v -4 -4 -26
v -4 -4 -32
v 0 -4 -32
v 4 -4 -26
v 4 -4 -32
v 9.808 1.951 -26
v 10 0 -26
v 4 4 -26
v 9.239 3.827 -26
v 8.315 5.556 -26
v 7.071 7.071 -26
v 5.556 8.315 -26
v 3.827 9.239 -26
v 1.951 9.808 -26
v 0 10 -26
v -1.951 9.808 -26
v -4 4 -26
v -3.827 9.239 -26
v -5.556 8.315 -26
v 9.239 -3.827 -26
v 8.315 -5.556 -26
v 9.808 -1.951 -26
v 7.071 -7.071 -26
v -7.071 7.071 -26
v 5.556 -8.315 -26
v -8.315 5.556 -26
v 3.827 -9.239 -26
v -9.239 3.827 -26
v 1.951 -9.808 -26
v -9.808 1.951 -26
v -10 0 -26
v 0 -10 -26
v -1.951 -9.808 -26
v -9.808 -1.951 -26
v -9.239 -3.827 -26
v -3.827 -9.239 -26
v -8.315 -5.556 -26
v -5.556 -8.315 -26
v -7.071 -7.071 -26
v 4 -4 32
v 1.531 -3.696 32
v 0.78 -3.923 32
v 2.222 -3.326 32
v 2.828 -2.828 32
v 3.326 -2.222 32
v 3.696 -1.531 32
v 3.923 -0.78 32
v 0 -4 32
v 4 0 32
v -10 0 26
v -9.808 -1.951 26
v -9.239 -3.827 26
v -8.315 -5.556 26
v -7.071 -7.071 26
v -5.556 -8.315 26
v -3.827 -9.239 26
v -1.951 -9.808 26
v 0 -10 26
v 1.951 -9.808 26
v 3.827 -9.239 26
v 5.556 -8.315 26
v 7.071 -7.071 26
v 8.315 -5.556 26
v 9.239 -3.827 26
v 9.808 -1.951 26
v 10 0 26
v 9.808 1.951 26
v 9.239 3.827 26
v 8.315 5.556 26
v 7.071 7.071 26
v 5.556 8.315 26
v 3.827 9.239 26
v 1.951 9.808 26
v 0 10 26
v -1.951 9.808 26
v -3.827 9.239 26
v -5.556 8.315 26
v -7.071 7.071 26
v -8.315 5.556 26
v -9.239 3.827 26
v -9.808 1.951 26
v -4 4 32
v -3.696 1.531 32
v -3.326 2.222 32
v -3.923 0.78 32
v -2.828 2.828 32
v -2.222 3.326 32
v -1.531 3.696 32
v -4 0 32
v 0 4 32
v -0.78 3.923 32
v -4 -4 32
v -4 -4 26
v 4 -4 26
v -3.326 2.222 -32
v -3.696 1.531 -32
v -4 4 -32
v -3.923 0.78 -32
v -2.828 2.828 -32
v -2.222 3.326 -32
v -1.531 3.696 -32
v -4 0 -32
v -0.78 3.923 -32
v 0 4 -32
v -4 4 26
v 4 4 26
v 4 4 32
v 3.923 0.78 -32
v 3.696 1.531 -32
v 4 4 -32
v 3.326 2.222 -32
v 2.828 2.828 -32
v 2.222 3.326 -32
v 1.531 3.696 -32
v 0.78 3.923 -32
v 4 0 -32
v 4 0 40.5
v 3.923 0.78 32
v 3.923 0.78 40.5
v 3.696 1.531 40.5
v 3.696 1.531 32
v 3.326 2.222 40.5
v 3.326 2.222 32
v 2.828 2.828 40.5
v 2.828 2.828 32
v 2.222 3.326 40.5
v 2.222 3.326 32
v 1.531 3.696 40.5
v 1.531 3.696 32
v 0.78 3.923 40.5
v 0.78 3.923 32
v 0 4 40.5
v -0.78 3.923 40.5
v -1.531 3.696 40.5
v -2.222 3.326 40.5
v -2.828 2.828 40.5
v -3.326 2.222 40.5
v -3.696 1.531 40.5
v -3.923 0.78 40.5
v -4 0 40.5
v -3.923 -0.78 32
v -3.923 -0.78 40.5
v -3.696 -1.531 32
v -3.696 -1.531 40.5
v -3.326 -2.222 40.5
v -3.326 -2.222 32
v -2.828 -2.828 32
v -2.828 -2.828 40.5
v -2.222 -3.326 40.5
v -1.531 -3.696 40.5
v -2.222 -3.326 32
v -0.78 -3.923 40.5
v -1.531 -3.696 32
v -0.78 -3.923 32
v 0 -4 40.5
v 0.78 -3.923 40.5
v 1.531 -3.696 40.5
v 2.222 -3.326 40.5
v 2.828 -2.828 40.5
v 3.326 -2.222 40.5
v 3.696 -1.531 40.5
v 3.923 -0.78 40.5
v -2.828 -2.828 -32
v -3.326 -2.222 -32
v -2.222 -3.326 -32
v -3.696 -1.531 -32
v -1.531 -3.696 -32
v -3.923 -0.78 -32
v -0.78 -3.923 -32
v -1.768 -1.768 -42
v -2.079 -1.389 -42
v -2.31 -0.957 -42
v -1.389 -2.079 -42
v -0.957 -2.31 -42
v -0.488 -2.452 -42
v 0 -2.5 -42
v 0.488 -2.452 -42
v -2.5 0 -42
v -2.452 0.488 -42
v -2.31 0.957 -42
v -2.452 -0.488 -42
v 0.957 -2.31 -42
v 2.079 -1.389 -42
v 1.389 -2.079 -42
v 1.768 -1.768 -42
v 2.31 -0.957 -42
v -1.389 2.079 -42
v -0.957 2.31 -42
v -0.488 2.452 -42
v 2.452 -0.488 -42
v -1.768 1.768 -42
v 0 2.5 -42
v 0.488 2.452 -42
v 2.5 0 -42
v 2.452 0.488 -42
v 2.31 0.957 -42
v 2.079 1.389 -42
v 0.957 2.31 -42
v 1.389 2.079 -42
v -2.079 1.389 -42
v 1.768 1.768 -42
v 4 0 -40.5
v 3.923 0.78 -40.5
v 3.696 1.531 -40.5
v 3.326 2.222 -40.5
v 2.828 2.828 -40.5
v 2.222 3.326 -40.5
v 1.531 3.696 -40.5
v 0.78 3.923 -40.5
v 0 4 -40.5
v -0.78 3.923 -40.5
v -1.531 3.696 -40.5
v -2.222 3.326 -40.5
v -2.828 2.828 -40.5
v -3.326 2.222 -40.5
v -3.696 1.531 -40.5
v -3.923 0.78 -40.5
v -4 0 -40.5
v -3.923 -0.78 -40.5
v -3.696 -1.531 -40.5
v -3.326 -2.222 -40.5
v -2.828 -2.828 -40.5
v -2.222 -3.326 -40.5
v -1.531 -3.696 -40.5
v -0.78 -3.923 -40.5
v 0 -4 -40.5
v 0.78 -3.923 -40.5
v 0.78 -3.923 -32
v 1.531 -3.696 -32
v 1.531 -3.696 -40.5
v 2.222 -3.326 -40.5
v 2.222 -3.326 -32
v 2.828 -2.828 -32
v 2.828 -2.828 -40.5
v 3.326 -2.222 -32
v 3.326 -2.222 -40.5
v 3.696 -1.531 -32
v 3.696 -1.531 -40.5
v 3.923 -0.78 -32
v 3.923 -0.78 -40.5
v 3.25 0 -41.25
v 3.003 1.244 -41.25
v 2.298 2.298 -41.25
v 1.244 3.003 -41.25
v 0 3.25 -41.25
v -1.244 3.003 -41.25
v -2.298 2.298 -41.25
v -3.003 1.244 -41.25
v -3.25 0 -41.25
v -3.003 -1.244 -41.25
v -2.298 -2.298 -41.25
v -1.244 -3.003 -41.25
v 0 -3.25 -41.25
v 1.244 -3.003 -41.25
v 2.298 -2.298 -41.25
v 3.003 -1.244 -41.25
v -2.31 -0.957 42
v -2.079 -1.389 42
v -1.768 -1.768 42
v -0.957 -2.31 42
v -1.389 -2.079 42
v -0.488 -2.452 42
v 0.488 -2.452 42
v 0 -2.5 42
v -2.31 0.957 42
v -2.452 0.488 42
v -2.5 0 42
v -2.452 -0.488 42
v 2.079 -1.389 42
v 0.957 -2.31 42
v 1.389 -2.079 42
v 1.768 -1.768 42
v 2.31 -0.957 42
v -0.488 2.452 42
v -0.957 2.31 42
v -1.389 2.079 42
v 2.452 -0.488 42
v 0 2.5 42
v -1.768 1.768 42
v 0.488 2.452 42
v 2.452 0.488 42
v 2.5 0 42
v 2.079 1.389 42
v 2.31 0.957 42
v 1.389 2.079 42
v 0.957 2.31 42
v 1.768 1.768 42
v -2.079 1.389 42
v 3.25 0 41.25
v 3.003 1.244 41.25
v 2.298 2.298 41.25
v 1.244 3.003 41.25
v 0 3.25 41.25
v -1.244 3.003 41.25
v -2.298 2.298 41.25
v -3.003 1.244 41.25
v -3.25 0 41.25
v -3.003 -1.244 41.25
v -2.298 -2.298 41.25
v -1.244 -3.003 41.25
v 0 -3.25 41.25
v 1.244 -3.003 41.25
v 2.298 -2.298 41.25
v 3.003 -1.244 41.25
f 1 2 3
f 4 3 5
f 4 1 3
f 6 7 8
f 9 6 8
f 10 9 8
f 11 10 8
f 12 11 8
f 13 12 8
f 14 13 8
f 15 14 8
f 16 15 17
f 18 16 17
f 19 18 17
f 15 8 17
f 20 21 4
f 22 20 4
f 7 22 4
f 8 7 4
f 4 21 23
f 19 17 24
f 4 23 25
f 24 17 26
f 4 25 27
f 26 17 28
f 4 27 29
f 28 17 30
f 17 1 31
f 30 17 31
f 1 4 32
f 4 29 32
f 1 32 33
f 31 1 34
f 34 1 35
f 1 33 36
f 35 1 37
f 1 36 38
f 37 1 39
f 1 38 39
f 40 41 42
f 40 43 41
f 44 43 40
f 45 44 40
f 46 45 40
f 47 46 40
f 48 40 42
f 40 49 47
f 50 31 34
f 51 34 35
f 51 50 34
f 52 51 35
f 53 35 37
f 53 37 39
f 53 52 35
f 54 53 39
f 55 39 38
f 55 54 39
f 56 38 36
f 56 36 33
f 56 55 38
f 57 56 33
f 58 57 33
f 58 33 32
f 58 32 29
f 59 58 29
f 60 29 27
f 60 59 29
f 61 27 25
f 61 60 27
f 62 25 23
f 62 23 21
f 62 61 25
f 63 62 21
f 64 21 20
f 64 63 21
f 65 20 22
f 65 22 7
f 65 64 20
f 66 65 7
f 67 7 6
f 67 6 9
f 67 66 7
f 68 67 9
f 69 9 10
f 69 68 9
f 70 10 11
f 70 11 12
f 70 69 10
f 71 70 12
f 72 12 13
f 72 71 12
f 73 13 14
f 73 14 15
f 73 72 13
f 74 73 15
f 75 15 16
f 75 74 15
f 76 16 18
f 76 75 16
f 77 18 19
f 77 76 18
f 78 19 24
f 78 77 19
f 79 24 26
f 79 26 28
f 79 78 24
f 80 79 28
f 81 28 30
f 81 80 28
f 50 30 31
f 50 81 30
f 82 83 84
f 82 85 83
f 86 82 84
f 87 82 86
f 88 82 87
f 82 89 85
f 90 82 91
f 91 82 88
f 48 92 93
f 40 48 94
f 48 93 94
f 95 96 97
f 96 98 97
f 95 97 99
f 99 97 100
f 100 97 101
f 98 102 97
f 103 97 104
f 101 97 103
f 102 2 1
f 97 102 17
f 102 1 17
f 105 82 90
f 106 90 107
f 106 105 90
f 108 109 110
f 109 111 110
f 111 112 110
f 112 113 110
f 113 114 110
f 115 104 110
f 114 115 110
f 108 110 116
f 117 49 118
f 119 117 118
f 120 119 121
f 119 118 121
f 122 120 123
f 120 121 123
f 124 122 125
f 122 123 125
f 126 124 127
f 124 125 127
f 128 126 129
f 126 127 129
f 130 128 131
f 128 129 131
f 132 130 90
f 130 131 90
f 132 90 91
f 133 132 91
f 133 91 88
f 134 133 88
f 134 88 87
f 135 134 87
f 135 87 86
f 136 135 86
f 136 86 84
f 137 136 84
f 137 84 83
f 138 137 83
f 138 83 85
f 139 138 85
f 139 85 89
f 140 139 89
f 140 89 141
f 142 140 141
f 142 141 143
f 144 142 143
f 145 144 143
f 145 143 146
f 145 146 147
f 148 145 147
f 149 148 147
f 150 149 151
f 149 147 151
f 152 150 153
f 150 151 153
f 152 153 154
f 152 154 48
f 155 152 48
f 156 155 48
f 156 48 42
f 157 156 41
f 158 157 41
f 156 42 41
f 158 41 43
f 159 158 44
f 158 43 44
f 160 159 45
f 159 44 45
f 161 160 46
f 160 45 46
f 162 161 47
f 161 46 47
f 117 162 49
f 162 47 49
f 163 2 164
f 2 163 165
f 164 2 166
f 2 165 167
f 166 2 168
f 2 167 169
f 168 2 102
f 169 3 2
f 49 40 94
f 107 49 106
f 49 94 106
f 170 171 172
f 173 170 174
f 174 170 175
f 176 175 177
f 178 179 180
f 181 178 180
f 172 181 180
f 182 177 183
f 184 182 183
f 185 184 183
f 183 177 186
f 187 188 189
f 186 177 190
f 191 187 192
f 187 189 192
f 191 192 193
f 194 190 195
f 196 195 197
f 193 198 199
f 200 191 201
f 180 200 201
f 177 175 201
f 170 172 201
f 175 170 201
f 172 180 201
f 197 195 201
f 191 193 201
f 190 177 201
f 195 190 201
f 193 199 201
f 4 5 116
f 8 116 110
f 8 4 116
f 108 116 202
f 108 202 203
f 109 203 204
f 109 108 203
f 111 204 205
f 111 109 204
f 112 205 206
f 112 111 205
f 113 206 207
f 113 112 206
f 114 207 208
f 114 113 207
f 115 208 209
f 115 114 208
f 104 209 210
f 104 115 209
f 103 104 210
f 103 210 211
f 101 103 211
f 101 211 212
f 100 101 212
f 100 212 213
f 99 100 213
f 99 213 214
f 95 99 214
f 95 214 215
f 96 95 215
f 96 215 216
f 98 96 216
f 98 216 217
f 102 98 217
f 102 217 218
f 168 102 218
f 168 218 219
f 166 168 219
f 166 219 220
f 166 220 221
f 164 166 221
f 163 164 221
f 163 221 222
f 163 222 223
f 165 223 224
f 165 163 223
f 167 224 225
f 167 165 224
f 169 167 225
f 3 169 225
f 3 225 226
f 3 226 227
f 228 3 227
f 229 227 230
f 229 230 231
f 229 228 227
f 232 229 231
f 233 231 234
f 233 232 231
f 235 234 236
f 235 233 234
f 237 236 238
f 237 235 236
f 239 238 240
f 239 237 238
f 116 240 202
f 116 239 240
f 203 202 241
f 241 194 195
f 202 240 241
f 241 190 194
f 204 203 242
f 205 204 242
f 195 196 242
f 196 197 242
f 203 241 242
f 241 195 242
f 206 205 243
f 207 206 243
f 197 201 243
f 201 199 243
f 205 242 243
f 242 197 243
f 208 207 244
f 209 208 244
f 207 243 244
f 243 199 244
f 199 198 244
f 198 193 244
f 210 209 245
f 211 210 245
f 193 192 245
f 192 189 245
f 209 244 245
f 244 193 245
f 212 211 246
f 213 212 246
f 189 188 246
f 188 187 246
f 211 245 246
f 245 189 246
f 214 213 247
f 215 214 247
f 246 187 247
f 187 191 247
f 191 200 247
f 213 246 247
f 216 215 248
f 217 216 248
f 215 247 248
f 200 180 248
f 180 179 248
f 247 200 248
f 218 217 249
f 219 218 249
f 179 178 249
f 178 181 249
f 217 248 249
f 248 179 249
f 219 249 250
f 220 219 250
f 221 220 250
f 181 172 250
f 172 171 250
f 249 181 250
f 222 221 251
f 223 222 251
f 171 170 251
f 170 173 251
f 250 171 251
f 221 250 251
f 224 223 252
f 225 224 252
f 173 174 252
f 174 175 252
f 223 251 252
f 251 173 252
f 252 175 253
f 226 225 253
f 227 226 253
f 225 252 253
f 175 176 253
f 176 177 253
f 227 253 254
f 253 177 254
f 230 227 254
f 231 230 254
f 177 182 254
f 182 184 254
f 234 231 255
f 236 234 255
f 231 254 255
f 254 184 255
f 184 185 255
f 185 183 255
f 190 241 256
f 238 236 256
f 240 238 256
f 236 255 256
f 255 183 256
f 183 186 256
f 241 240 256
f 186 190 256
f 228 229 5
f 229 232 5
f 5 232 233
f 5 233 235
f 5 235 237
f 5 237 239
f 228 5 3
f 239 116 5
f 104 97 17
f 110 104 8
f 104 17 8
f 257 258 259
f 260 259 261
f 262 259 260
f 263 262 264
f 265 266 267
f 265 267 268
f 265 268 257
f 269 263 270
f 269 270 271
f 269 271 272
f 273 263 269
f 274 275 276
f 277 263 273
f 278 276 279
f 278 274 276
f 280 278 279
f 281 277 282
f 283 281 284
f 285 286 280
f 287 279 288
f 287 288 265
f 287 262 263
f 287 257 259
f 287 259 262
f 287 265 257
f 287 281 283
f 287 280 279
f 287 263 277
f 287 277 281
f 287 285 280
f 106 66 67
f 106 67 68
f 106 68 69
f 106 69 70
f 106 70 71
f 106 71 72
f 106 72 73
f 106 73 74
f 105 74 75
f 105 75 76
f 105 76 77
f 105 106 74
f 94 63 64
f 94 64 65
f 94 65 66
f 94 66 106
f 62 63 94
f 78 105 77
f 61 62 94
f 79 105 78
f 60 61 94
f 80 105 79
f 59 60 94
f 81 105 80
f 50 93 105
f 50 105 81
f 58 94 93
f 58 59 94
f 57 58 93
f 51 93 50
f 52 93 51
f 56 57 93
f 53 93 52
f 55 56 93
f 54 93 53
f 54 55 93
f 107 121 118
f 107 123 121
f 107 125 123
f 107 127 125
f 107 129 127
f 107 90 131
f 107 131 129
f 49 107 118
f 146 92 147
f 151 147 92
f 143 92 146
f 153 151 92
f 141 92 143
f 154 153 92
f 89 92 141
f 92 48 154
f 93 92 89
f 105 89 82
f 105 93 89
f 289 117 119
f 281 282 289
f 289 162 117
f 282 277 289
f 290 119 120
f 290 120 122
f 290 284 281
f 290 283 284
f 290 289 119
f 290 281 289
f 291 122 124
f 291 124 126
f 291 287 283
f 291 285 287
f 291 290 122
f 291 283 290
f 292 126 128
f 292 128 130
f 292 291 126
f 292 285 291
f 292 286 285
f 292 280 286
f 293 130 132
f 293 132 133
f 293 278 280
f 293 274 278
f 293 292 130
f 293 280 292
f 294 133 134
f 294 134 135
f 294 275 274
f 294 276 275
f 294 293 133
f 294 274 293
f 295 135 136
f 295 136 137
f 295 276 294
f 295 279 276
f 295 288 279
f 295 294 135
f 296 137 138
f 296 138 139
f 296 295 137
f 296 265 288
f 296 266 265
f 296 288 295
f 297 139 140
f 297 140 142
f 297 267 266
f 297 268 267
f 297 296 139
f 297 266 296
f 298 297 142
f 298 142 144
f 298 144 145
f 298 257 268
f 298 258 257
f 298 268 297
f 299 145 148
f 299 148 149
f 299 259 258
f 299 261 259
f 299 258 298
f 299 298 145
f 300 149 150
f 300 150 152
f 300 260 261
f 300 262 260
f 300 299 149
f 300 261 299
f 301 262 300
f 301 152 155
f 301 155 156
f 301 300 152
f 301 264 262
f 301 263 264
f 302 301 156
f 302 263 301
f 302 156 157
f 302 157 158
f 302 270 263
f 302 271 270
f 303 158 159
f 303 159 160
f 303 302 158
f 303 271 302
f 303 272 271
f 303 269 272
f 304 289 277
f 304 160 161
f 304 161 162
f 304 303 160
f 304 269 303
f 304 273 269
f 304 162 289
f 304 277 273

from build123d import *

# Parameters (mm, degrees)
SKIZZE1_R                       = 10
AUFSATZ_LINEAR_AUSTRAGEN1_DEPTH = 26
SKIZZE2_W                       = 8
SKIZZE2_H                       = 8
AUFSATZ_LINEAR_AUSTRAGEN2_DEPTH = 6
SKIZZE3_R                       = 4
AUFSATZ_LINEAR_AUSTRAGEN3_DEPTH = 10
FASE1_SIZE                      = 1.5


with BuildPart() as part:
    # Skizze1 → Aufsatz-Linear austragen1 (new body)
    with BuildSketch(Plane.XY):
        with Locations(Location((0, 0, 0), (0, 0, 180))):
            Circle(SKIZZE1_R)
    extrude(amount=AUFSATZ_LINEAR_AUSTRAGEN1_DEPTH)

    # Skizze2 → Aufsatz-Linear austragen2 (add)
    with BuildSketch(Plane.XY.offset(26)):
        Rectangle(SKIZZE2_W, SKIZZE2_H)
    extrude(amount=AUFSATZ_LINEAR_AUSTRAGEN2_DEPTH)

    # Skizze3 → Aufsatz-Linear austragen3 (add)
    with BuildSketch(Plane.XY.offset(32)):
        Circle(SKIZZE3_R)
    extrude(amount=AUFSATZ_LINEAR_AUSTRAGEN3_DEPTH)

    # Fase1
    fase1_edges = [part.edges().sort_by_distance(p)[0] for p in [
        (-4, 0, 42),
    ]]
    chamfer(fase1_edges, length=FASE1_SIZE)

    # Spiegeln1: part across plane


with BuildPart() as part_1:
    add(part.part)
    add(part.part.mirror(Plane.XY))


solid = part_1.part
